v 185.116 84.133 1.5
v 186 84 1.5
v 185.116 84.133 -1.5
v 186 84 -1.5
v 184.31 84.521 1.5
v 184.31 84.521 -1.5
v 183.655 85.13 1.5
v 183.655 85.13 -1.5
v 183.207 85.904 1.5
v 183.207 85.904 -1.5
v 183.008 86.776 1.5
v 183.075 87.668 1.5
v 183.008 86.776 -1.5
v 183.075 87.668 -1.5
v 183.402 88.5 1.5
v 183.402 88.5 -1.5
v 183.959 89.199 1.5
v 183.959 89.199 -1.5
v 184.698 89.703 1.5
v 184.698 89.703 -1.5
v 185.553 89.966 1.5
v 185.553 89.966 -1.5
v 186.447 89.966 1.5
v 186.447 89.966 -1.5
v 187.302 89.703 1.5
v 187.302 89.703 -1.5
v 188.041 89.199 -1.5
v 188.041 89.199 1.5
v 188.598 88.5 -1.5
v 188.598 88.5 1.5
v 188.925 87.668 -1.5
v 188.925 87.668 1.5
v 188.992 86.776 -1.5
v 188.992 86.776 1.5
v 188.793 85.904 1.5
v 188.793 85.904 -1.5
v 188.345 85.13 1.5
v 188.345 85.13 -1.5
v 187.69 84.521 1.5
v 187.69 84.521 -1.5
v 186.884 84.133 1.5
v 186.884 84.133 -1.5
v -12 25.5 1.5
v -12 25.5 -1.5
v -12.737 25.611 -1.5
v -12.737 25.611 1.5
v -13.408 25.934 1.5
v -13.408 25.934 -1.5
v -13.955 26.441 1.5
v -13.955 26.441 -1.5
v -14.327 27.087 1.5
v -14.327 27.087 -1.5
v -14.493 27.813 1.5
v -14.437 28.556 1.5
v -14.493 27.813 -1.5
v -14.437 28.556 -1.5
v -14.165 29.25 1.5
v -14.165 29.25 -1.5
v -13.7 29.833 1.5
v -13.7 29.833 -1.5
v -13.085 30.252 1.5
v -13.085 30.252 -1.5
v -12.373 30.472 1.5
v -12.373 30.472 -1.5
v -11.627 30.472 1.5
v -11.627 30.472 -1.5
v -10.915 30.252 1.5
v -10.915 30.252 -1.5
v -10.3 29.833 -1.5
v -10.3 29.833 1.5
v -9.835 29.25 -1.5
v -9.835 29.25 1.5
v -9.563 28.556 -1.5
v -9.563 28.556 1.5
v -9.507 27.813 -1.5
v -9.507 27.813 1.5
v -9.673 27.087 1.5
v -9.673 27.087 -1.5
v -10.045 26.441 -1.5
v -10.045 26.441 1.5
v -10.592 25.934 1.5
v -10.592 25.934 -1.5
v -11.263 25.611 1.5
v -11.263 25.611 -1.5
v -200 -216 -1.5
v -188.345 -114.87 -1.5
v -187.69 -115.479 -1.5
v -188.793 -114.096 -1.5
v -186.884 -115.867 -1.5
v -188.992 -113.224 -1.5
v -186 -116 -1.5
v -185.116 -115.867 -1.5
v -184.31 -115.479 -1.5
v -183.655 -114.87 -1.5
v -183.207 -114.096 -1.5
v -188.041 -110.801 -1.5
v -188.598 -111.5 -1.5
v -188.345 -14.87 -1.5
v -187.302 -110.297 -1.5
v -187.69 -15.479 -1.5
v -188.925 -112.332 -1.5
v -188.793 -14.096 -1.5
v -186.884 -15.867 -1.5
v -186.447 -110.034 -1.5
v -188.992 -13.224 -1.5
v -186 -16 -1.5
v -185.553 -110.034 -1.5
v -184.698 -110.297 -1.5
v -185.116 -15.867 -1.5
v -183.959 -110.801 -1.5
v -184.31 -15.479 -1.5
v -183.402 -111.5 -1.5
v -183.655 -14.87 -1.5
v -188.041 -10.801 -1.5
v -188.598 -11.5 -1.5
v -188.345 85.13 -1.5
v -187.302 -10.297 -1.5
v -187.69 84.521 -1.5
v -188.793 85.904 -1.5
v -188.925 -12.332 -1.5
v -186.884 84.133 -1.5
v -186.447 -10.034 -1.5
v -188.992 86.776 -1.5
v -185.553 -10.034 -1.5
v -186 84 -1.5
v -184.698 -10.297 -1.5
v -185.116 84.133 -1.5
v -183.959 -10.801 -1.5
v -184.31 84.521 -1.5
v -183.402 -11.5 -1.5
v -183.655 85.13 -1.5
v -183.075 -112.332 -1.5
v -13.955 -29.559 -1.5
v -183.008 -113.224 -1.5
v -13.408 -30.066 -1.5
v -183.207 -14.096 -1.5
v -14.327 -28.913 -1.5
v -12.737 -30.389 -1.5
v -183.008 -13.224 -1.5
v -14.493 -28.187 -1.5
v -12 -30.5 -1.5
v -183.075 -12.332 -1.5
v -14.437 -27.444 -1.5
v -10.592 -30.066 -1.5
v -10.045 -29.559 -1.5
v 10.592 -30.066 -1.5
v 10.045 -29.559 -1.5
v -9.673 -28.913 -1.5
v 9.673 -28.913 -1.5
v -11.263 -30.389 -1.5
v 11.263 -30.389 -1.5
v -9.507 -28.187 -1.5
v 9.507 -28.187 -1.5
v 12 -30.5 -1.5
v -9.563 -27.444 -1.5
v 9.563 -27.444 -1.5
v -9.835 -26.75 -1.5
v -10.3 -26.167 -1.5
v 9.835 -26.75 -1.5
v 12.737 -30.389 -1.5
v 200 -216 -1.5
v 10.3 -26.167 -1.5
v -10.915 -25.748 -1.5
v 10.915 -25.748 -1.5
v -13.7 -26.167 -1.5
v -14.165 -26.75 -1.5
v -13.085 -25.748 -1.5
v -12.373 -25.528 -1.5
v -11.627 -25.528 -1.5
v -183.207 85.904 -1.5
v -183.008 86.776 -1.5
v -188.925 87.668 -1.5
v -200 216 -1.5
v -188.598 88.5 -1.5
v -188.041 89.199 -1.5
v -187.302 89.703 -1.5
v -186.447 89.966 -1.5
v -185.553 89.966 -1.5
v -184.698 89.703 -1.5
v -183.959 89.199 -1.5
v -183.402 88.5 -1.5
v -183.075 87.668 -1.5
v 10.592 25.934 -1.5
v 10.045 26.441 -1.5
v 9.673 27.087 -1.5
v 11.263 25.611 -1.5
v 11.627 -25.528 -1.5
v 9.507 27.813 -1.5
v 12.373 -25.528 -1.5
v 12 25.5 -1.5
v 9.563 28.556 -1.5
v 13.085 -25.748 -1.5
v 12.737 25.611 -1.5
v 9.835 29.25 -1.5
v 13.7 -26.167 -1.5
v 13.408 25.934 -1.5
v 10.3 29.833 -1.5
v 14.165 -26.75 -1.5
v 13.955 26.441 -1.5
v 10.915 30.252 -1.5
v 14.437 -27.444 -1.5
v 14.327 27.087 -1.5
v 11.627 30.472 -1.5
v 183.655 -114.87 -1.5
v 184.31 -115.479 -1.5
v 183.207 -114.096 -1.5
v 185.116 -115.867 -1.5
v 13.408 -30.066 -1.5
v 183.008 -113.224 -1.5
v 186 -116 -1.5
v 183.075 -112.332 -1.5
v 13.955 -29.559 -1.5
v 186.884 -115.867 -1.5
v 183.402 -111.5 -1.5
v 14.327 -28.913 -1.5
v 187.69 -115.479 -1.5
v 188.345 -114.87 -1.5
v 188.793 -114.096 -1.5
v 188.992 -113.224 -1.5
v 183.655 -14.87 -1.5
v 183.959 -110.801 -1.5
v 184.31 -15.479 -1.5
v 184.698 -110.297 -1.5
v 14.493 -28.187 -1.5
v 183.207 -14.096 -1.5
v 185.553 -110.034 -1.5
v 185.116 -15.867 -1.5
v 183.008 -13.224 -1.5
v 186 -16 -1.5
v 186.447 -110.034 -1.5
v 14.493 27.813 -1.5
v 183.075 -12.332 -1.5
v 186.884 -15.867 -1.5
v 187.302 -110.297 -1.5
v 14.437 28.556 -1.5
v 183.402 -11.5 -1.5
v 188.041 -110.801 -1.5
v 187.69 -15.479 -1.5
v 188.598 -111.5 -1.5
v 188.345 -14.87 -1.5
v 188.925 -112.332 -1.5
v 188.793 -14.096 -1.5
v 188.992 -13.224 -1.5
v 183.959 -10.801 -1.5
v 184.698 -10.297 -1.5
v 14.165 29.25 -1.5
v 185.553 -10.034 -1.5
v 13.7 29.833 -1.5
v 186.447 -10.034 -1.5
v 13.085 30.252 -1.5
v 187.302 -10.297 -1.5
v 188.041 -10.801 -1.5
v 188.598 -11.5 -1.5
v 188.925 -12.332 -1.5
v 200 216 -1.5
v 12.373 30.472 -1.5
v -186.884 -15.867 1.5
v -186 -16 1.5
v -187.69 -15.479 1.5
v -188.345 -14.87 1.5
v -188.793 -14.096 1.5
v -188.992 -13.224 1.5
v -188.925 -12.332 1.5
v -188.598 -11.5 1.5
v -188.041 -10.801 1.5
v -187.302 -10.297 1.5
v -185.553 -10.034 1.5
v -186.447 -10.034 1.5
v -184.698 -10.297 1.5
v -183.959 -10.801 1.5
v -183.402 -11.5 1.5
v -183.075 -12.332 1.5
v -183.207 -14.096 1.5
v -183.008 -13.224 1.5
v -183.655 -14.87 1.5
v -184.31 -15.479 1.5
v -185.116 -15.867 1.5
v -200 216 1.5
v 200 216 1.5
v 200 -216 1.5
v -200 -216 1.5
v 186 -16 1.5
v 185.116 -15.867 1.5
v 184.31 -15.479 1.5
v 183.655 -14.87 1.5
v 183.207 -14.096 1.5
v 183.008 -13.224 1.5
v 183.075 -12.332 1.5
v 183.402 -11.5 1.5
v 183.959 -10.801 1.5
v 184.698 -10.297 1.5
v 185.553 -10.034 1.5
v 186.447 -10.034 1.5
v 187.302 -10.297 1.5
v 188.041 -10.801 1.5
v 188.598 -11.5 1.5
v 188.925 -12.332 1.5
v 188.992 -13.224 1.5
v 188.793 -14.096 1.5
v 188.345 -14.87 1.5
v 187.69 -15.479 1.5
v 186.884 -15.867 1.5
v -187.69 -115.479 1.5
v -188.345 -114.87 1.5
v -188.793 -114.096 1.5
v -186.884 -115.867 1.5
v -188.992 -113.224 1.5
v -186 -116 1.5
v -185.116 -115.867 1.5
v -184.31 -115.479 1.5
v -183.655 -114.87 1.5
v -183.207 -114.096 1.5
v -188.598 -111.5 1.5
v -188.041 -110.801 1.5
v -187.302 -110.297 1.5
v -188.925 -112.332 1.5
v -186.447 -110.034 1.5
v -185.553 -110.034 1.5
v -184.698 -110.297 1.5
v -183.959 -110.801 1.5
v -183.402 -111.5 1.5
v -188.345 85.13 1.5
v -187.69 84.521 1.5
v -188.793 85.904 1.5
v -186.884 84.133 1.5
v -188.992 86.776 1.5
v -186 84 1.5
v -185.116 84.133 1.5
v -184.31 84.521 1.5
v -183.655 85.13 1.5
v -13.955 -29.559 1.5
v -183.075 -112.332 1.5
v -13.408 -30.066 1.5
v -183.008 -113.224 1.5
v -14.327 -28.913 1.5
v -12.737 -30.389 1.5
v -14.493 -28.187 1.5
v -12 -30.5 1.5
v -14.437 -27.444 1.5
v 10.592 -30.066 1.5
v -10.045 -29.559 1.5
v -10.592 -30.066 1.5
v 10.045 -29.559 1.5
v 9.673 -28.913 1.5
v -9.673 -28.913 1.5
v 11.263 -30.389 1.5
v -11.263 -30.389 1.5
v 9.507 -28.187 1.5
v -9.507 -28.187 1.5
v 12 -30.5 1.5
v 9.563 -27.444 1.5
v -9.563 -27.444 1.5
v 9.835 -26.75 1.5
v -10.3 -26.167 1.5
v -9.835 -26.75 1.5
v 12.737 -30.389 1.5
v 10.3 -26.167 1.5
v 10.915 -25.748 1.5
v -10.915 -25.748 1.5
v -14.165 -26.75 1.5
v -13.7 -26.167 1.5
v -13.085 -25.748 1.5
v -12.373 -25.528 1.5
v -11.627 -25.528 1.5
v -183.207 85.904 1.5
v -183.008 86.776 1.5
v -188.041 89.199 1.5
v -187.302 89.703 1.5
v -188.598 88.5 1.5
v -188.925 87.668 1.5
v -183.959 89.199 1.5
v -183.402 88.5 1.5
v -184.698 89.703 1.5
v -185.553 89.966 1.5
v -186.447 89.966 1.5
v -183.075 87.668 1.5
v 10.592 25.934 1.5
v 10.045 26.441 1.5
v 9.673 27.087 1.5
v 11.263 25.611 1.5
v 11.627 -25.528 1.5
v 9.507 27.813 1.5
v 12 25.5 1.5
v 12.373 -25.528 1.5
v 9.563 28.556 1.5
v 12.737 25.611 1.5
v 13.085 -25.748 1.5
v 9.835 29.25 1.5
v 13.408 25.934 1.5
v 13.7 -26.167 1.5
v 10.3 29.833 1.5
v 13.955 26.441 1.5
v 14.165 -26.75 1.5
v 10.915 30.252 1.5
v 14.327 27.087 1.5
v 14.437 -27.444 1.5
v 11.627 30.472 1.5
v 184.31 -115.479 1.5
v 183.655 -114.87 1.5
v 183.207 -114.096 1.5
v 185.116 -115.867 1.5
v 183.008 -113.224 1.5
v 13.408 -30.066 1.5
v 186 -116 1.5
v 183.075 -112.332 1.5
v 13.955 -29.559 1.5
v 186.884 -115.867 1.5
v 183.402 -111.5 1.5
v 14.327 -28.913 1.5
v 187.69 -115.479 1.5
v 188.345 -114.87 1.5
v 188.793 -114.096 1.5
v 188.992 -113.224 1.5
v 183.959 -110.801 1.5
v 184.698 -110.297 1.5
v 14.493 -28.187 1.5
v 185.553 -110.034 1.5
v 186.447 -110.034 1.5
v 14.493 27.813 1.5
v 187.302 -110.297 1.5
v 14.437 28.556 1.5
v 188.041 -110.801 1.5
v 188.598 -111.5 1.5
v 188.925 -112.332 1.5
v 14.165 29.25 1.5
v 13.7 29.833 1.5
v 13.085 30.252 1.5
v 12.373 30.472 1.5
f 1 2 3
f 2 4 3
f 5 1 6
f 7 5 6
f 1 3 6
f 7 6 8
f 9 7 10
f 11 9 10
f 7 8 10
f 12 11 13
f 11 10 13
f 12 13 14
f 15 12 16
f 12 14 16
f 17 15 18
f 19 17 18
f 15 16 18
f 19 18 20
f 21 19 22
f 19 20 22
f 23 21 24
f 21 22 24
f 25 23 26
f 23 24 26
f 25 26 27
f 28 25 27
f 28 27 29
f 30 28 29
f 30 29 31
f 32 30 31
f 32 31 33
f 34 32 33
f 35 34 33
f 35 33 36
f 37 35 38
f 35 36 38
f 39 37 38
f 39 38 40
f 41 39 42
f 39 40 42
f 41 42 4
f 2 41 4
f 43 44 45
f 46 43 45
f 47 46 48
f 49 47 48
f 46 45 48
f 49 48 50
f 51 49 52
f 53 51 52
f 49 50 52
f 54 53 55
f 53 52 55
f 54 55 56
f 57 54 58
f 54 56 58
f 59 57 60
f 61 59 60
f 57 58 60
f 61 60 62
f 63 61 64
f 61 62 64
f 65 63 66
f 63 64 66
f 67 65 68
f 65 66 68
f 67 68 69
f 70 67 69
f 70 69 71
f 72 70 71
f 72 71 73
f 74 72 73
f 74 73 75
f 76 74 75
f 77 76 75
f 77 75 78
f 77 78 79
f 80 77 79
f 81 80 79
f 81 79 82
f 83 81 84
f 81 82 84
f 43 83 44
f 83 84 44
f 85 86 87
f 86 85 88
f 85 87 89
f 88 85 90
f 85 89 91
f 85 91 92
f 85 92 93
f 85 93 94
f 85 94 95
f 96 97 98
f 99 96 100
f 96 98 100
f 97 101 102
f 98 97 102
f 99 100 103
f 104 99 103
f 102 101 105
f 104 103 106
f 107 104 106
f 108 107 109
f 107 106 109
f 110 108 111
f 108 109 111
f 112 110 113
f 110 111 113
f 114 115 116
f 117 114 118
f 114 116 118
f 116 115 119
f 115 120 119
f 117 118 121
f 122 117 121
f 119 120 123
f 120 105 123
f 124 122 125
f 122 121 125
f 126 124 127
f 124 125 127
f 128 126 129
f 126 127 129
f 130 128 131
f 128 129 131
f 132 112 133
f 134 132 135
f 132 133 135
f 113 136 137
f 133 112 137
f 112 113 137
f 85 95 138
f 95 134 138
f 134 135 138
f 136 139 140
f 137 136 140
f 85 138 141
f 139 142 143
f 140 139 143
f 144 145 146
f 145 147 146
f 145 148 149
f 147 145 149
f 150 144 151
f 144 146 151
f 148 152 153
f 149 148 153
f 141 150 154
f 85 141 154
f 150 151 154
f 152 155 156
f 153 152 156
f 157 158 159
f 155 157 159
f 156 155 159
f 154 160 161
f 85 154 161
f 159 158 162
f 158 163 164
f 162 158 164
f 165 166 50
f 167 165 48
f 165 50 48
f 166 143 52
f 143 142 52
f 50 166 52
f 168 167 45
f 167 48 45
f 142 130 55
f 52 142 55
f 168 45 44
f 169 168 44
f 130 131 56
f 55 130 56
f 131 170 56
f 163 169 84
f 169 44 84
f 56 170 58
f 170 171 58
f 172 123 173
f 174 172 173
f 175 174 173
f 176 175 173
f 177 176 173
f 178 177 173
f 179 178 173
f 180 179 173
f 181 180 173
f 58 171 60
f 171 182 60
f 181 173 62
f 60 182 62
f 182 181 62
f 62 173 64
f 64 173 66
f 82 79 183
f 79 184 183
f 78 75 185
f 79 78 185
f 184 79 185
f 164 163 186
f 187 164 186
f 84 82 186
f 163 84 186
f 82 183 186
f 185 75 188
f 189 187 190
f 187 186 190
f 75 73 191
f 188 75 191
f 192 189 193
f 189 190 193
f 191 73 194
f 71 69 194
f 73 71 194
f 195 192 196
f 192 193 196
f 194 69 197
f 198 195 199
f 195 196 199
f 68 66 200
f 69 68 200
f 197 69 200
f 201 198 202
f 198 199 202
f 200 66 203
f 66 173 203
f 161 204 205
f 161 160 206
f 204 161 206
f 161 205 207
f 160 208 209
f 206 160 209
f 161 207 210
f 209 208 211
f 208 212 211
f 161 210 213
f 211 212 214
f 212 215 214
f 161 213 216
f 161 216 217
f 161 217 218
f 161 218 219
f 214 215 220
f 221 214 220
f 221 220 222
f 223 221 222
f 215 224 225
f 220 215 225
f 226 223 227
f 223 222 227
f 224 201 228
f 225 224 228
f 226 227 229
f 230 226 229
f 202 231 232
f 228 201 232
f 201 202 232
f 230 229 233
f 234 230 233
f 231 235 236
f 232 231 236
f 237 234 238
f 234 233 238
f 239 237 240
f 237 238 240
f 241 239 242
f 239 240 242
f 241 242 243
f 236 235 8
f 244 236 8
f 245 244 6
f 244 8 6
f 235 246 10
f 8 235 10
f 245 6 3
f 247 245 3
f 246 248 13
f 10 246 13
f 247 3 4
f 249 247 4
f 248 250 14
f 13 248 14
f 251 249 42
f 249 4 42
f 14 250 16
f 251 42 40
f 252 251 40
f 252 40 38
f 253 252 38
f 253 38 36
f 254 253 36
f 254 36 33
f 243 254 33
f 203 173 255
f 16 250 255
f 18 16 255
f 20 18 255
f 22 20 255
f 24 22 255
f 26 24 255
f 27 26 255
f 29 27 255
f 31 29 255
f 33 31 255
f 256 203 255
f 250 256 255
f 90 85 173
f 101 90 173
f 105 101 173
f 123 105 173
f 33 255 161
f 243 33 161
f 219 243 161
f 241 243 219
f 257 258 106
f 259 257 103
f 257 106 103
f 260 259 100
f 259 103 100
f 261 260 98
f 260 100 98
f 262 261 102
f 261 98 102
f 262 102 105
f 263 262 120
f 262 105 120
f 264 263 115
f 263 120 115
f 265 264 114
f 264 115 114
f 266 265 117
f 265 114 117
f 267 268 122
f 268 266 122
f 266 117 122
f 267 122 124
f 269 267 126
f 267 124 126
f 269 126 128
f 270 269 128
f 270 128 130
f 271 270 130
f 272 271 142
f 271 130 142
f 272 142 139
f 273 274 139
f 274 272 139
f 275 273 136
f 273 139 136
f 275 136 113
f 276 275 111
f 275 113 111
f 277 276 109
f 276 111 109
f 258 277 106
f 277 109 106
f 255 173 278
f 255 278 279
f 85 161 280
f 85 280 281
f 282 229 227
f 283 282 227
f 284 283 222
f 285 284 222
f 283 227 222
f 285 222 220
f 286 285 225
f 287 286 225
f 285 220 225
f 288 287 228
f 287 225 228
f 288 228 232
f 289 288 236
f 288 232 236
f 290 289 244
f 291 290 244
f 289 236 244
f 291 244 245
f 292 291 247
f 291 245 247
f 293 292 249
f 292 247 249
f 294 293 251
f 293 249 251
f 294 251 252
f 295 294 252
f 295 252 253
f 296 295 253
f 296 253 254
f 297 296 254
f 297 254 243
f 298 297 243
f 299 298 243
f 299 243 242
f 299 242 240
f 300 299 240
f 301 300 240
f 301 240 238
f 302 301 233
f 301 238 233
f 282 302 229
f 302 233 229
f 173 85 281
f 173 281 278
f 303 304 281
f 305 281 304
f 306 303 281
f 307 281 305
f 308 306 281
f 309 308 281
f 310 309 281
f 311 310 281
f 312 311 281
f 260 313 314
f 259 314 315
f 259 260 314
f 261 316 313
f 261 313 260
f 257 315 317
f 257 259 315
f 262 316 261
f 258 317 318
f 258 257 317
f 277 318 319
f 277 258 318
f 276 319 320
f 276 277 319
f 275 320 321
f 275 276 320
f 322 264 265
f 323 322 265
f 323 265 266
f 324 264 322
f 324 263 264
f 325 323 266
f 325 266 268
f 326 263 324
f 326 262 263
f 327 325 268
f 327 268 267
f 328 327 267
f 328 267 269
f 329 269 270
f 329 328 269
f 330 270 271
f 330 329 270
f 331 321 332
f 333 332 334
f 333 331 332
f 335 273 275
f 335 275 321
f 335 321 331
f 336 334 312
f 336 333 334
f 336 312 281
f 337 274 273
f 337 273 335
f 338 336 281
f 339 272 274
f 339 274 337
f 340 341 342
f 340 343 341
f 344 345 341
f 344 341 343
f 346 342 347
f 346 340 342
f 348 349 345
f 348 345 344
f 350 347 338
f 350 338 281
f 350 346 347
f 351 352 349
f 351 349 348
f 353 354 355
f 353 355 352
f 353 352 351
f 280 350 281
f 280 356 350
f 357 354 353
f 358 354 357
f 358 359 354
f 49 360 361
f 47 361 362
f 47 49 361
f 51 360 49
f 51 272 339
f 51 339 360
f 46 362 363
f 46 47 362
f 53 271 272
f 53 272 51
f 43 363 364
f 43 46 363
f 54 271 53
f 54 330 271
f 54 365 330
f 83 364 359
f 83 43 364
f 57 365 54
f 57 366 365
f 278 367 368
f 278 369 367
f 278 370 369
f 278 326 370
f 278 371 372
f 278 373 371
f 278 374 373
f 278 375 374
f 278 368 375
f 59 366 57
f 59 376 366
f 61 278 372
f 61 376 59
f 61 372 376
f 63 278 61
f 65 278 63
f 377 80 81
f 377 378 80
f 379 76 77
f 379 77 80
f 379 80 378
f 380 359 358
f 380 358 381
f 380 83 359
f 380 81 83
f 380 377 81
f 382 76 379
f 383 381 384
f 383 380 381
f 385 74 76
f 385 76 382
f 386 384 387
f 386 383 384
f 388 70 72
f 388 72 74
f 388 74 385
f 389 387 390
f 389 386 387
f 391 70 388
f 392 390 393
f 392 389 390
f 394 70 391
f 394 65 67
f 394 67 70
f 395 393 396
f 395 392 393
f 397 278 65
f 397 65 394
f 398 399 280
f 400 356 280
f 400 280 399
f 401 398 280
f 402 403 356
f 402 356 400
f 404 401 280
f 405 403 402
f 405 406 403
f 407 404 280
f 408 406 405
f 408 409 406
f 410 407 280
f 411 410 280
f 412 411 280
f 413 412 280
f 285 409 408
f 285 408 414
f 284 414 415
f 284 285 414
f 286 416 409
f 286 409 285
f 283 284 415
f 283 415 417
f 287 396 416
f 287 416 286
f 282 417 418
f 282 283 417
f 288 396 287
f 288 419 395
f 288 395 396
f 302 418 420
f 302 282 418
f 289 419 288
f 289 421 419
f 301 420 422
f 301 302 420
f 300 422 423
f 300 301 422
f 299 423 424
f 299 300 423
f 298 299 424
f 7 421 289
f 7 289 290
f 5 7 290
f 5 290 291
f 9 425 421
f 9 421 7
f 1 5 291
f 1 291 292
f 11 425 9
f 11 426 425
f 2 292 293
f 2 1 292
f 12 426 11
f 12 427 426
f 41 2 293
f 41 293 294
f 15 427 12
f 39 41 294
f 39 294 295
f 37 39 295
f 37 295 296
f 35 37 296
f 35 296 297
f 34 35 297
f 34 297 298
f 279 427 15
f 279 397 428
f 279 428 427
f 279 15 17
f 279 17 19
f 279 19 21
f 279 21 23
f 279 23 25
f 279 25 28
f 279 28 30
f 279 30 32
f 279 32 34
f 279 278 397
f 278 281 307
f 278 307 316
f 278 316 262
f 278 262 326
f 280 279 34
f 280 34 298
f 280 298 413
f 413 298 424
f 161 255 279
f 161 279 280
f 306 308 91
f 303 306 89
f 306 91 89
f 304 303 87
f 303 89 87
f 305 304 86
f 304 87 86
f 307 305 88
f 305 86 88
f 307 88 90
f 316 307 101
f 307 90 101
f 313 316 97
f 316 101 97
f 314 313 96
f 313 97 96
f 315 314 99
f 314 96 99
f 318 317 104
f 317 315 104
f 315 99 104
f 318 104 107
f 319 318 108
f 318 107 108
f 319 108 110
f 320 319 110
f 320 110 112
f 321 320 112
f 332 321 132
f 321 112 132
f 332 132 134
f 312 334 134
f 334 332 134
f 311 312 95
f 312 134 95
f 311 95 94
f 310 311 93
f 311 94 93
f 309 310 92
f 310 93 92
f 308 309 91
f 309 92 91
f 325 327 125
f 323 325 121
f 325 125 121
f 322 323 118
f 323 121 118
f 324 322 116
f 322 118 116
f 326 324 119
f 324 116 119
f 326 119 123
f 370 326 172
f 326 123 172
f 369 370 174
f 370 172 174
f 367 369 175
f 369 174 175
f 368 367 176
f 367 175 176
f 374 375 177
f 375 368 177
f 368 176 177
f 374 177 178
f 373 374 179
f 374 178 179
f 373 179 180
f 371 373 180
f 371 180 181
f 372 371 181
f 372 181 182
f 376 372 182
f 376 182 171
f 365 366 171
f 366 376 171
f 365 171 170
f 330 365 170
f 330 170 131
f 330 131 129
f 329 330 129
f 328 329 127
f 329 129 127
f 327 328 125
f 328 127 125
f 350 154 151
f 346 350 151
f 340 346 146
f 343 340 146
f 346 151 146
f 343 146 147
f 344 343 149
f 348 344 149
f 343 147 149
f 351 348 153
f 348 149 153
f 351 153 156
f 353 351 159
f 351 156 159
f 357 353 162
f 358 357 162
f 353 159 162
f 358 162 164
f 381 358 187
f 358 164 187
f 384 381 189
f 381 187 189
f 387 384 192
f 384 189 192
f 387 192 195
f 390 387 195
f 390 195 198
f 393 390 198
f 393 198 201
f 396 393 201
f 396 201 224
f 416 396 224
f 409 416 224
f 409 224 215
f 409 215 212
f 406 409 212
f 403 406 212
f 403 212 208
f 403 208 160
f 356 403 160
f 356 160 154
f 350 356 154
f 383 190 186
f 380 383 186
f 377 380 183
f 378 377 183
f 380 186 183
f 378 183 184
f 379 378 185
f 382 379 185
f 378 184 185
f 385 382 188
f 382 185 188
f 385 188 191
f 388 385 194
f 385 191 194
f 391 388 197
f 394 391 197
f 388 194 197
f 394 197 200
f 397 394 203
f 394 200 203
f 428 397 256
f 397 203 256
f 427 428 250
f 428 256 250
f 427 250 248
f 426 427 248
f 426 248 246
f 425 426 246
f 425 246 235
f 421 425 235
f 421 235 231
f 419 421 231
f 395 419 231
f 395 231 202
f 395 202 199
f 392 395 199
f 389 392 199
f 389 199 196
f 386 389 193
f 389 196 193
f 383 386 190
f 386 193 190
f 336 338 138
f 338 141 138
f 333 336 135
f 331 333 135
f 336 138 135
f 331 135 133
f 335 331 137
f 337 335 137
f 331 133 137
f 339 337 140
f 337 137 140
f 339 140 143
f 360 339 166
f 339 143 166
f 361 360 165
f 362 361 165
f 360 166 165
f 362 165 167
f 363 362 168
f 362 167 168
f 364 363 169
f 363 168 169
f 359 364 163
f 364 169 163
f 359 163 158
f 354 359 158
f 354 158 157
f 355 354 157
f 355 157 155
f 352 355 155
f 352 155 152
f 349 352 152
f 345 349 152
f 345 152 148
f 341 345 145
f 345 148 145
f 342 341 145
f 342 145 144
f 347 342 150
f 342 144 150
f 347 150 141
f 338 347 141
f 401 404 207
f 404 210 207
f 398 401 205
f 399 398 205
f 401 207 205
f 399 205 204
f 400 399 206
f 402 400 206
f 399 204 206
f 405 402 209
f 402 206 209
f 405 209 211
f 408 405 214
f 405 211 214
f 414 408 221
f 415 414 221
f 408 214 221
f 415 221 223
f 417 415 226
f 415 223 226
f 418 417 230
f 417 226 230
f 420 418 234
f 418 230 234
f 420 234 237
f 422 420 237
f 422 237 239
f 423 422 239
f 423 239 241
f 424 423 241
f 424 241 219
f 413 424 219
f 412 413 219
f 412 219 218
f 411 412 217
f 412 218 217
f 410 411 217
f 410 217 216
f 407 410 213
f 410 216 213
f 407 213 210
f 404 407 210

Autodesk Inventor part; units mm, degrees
ref_plane "YZ Plane" through (0, 0, 0) normal (1, 0, 0) x (0, 1, 0)
ref_plane "XZ Plane" through (0, 0, 0) normal (0, 1, 0) x (-1, 0, 0)
ref_plane "XY Plane" through (0, 0, 0) normal (0, 0, 1) x (1, 0, 0)
sketch "Sketch1" plane through (0, 0, 0) normal (0, 0, 1) x (1, 0, 0)
  line L0 (-200, 216) -> (200, 216)
  line L1 (200, 216) -> (200, -216)
  line L2 (200, -216) -> (-200, -216)
  line L3 (-200, -216) -> (-200, 216)
  line L4 (-200, 216) -> (200, -216) construction
  line L5 (200, 216) -> (-200, -216) construction
  point P0 (0, 0)
  dimension "d0" = 432
  dimension "d1" = 400
extrude "Extrusion1" add sketch "Sketch1" along normal mid plane 3
sketch "Sketch2" plane through (0, 0, 1.5) normal (0, 0, 1) x (1, 0, 0)
  line L0 (-200, -216) -> (200, -216) projected
  line L1 (200, -216) -> (200, 216) projected
  point P0 (0, 0)
  point P1 (186, -113)
  point P2 (186, -13)
  point P3 (186, 87)
  dimension "d4" = 103
  dimension "d5" = 100
  dimension "d6" = 100
  dimension "d7" = 14
hole "Hole1" at (186, -113, 1.5) at (186, -13, 1.5) at (186, 87, 1.5) direction (0, 0, -1) diameter 6 depth 14.2 tip angle 118
mirror "Mirror1" about plane through (0, 0, 0) normal (1, 0, 0) of "Hole1"
sketch "Sketch3" plane through (0, 0, 1.5) normal (0, 0, 1) x (1, 0, 0)
  point P0 (0, 0)
  point P1 (-12, -28)
  point P2 (-12, 28)
  point P3 (12, 28)
  point P4 (12, -28)
  dimension "d15" = 24
  dimension "d16" = 56
  dimension "d17" = 12
  dimension "d18" = 28
hole "Hole2" at (-12, -28, 1.5) at (-12, 28, 1.5) at (12, 28, 1.5) at (12, -28, 1.5) direction (0, 0, -1) diameter 5 depth 14.2 tip angle 118
equation "\"d6\" = d5"
properties part number "HCMUTE-CDT23-KXL_A05" material "PMMA Plastic"
